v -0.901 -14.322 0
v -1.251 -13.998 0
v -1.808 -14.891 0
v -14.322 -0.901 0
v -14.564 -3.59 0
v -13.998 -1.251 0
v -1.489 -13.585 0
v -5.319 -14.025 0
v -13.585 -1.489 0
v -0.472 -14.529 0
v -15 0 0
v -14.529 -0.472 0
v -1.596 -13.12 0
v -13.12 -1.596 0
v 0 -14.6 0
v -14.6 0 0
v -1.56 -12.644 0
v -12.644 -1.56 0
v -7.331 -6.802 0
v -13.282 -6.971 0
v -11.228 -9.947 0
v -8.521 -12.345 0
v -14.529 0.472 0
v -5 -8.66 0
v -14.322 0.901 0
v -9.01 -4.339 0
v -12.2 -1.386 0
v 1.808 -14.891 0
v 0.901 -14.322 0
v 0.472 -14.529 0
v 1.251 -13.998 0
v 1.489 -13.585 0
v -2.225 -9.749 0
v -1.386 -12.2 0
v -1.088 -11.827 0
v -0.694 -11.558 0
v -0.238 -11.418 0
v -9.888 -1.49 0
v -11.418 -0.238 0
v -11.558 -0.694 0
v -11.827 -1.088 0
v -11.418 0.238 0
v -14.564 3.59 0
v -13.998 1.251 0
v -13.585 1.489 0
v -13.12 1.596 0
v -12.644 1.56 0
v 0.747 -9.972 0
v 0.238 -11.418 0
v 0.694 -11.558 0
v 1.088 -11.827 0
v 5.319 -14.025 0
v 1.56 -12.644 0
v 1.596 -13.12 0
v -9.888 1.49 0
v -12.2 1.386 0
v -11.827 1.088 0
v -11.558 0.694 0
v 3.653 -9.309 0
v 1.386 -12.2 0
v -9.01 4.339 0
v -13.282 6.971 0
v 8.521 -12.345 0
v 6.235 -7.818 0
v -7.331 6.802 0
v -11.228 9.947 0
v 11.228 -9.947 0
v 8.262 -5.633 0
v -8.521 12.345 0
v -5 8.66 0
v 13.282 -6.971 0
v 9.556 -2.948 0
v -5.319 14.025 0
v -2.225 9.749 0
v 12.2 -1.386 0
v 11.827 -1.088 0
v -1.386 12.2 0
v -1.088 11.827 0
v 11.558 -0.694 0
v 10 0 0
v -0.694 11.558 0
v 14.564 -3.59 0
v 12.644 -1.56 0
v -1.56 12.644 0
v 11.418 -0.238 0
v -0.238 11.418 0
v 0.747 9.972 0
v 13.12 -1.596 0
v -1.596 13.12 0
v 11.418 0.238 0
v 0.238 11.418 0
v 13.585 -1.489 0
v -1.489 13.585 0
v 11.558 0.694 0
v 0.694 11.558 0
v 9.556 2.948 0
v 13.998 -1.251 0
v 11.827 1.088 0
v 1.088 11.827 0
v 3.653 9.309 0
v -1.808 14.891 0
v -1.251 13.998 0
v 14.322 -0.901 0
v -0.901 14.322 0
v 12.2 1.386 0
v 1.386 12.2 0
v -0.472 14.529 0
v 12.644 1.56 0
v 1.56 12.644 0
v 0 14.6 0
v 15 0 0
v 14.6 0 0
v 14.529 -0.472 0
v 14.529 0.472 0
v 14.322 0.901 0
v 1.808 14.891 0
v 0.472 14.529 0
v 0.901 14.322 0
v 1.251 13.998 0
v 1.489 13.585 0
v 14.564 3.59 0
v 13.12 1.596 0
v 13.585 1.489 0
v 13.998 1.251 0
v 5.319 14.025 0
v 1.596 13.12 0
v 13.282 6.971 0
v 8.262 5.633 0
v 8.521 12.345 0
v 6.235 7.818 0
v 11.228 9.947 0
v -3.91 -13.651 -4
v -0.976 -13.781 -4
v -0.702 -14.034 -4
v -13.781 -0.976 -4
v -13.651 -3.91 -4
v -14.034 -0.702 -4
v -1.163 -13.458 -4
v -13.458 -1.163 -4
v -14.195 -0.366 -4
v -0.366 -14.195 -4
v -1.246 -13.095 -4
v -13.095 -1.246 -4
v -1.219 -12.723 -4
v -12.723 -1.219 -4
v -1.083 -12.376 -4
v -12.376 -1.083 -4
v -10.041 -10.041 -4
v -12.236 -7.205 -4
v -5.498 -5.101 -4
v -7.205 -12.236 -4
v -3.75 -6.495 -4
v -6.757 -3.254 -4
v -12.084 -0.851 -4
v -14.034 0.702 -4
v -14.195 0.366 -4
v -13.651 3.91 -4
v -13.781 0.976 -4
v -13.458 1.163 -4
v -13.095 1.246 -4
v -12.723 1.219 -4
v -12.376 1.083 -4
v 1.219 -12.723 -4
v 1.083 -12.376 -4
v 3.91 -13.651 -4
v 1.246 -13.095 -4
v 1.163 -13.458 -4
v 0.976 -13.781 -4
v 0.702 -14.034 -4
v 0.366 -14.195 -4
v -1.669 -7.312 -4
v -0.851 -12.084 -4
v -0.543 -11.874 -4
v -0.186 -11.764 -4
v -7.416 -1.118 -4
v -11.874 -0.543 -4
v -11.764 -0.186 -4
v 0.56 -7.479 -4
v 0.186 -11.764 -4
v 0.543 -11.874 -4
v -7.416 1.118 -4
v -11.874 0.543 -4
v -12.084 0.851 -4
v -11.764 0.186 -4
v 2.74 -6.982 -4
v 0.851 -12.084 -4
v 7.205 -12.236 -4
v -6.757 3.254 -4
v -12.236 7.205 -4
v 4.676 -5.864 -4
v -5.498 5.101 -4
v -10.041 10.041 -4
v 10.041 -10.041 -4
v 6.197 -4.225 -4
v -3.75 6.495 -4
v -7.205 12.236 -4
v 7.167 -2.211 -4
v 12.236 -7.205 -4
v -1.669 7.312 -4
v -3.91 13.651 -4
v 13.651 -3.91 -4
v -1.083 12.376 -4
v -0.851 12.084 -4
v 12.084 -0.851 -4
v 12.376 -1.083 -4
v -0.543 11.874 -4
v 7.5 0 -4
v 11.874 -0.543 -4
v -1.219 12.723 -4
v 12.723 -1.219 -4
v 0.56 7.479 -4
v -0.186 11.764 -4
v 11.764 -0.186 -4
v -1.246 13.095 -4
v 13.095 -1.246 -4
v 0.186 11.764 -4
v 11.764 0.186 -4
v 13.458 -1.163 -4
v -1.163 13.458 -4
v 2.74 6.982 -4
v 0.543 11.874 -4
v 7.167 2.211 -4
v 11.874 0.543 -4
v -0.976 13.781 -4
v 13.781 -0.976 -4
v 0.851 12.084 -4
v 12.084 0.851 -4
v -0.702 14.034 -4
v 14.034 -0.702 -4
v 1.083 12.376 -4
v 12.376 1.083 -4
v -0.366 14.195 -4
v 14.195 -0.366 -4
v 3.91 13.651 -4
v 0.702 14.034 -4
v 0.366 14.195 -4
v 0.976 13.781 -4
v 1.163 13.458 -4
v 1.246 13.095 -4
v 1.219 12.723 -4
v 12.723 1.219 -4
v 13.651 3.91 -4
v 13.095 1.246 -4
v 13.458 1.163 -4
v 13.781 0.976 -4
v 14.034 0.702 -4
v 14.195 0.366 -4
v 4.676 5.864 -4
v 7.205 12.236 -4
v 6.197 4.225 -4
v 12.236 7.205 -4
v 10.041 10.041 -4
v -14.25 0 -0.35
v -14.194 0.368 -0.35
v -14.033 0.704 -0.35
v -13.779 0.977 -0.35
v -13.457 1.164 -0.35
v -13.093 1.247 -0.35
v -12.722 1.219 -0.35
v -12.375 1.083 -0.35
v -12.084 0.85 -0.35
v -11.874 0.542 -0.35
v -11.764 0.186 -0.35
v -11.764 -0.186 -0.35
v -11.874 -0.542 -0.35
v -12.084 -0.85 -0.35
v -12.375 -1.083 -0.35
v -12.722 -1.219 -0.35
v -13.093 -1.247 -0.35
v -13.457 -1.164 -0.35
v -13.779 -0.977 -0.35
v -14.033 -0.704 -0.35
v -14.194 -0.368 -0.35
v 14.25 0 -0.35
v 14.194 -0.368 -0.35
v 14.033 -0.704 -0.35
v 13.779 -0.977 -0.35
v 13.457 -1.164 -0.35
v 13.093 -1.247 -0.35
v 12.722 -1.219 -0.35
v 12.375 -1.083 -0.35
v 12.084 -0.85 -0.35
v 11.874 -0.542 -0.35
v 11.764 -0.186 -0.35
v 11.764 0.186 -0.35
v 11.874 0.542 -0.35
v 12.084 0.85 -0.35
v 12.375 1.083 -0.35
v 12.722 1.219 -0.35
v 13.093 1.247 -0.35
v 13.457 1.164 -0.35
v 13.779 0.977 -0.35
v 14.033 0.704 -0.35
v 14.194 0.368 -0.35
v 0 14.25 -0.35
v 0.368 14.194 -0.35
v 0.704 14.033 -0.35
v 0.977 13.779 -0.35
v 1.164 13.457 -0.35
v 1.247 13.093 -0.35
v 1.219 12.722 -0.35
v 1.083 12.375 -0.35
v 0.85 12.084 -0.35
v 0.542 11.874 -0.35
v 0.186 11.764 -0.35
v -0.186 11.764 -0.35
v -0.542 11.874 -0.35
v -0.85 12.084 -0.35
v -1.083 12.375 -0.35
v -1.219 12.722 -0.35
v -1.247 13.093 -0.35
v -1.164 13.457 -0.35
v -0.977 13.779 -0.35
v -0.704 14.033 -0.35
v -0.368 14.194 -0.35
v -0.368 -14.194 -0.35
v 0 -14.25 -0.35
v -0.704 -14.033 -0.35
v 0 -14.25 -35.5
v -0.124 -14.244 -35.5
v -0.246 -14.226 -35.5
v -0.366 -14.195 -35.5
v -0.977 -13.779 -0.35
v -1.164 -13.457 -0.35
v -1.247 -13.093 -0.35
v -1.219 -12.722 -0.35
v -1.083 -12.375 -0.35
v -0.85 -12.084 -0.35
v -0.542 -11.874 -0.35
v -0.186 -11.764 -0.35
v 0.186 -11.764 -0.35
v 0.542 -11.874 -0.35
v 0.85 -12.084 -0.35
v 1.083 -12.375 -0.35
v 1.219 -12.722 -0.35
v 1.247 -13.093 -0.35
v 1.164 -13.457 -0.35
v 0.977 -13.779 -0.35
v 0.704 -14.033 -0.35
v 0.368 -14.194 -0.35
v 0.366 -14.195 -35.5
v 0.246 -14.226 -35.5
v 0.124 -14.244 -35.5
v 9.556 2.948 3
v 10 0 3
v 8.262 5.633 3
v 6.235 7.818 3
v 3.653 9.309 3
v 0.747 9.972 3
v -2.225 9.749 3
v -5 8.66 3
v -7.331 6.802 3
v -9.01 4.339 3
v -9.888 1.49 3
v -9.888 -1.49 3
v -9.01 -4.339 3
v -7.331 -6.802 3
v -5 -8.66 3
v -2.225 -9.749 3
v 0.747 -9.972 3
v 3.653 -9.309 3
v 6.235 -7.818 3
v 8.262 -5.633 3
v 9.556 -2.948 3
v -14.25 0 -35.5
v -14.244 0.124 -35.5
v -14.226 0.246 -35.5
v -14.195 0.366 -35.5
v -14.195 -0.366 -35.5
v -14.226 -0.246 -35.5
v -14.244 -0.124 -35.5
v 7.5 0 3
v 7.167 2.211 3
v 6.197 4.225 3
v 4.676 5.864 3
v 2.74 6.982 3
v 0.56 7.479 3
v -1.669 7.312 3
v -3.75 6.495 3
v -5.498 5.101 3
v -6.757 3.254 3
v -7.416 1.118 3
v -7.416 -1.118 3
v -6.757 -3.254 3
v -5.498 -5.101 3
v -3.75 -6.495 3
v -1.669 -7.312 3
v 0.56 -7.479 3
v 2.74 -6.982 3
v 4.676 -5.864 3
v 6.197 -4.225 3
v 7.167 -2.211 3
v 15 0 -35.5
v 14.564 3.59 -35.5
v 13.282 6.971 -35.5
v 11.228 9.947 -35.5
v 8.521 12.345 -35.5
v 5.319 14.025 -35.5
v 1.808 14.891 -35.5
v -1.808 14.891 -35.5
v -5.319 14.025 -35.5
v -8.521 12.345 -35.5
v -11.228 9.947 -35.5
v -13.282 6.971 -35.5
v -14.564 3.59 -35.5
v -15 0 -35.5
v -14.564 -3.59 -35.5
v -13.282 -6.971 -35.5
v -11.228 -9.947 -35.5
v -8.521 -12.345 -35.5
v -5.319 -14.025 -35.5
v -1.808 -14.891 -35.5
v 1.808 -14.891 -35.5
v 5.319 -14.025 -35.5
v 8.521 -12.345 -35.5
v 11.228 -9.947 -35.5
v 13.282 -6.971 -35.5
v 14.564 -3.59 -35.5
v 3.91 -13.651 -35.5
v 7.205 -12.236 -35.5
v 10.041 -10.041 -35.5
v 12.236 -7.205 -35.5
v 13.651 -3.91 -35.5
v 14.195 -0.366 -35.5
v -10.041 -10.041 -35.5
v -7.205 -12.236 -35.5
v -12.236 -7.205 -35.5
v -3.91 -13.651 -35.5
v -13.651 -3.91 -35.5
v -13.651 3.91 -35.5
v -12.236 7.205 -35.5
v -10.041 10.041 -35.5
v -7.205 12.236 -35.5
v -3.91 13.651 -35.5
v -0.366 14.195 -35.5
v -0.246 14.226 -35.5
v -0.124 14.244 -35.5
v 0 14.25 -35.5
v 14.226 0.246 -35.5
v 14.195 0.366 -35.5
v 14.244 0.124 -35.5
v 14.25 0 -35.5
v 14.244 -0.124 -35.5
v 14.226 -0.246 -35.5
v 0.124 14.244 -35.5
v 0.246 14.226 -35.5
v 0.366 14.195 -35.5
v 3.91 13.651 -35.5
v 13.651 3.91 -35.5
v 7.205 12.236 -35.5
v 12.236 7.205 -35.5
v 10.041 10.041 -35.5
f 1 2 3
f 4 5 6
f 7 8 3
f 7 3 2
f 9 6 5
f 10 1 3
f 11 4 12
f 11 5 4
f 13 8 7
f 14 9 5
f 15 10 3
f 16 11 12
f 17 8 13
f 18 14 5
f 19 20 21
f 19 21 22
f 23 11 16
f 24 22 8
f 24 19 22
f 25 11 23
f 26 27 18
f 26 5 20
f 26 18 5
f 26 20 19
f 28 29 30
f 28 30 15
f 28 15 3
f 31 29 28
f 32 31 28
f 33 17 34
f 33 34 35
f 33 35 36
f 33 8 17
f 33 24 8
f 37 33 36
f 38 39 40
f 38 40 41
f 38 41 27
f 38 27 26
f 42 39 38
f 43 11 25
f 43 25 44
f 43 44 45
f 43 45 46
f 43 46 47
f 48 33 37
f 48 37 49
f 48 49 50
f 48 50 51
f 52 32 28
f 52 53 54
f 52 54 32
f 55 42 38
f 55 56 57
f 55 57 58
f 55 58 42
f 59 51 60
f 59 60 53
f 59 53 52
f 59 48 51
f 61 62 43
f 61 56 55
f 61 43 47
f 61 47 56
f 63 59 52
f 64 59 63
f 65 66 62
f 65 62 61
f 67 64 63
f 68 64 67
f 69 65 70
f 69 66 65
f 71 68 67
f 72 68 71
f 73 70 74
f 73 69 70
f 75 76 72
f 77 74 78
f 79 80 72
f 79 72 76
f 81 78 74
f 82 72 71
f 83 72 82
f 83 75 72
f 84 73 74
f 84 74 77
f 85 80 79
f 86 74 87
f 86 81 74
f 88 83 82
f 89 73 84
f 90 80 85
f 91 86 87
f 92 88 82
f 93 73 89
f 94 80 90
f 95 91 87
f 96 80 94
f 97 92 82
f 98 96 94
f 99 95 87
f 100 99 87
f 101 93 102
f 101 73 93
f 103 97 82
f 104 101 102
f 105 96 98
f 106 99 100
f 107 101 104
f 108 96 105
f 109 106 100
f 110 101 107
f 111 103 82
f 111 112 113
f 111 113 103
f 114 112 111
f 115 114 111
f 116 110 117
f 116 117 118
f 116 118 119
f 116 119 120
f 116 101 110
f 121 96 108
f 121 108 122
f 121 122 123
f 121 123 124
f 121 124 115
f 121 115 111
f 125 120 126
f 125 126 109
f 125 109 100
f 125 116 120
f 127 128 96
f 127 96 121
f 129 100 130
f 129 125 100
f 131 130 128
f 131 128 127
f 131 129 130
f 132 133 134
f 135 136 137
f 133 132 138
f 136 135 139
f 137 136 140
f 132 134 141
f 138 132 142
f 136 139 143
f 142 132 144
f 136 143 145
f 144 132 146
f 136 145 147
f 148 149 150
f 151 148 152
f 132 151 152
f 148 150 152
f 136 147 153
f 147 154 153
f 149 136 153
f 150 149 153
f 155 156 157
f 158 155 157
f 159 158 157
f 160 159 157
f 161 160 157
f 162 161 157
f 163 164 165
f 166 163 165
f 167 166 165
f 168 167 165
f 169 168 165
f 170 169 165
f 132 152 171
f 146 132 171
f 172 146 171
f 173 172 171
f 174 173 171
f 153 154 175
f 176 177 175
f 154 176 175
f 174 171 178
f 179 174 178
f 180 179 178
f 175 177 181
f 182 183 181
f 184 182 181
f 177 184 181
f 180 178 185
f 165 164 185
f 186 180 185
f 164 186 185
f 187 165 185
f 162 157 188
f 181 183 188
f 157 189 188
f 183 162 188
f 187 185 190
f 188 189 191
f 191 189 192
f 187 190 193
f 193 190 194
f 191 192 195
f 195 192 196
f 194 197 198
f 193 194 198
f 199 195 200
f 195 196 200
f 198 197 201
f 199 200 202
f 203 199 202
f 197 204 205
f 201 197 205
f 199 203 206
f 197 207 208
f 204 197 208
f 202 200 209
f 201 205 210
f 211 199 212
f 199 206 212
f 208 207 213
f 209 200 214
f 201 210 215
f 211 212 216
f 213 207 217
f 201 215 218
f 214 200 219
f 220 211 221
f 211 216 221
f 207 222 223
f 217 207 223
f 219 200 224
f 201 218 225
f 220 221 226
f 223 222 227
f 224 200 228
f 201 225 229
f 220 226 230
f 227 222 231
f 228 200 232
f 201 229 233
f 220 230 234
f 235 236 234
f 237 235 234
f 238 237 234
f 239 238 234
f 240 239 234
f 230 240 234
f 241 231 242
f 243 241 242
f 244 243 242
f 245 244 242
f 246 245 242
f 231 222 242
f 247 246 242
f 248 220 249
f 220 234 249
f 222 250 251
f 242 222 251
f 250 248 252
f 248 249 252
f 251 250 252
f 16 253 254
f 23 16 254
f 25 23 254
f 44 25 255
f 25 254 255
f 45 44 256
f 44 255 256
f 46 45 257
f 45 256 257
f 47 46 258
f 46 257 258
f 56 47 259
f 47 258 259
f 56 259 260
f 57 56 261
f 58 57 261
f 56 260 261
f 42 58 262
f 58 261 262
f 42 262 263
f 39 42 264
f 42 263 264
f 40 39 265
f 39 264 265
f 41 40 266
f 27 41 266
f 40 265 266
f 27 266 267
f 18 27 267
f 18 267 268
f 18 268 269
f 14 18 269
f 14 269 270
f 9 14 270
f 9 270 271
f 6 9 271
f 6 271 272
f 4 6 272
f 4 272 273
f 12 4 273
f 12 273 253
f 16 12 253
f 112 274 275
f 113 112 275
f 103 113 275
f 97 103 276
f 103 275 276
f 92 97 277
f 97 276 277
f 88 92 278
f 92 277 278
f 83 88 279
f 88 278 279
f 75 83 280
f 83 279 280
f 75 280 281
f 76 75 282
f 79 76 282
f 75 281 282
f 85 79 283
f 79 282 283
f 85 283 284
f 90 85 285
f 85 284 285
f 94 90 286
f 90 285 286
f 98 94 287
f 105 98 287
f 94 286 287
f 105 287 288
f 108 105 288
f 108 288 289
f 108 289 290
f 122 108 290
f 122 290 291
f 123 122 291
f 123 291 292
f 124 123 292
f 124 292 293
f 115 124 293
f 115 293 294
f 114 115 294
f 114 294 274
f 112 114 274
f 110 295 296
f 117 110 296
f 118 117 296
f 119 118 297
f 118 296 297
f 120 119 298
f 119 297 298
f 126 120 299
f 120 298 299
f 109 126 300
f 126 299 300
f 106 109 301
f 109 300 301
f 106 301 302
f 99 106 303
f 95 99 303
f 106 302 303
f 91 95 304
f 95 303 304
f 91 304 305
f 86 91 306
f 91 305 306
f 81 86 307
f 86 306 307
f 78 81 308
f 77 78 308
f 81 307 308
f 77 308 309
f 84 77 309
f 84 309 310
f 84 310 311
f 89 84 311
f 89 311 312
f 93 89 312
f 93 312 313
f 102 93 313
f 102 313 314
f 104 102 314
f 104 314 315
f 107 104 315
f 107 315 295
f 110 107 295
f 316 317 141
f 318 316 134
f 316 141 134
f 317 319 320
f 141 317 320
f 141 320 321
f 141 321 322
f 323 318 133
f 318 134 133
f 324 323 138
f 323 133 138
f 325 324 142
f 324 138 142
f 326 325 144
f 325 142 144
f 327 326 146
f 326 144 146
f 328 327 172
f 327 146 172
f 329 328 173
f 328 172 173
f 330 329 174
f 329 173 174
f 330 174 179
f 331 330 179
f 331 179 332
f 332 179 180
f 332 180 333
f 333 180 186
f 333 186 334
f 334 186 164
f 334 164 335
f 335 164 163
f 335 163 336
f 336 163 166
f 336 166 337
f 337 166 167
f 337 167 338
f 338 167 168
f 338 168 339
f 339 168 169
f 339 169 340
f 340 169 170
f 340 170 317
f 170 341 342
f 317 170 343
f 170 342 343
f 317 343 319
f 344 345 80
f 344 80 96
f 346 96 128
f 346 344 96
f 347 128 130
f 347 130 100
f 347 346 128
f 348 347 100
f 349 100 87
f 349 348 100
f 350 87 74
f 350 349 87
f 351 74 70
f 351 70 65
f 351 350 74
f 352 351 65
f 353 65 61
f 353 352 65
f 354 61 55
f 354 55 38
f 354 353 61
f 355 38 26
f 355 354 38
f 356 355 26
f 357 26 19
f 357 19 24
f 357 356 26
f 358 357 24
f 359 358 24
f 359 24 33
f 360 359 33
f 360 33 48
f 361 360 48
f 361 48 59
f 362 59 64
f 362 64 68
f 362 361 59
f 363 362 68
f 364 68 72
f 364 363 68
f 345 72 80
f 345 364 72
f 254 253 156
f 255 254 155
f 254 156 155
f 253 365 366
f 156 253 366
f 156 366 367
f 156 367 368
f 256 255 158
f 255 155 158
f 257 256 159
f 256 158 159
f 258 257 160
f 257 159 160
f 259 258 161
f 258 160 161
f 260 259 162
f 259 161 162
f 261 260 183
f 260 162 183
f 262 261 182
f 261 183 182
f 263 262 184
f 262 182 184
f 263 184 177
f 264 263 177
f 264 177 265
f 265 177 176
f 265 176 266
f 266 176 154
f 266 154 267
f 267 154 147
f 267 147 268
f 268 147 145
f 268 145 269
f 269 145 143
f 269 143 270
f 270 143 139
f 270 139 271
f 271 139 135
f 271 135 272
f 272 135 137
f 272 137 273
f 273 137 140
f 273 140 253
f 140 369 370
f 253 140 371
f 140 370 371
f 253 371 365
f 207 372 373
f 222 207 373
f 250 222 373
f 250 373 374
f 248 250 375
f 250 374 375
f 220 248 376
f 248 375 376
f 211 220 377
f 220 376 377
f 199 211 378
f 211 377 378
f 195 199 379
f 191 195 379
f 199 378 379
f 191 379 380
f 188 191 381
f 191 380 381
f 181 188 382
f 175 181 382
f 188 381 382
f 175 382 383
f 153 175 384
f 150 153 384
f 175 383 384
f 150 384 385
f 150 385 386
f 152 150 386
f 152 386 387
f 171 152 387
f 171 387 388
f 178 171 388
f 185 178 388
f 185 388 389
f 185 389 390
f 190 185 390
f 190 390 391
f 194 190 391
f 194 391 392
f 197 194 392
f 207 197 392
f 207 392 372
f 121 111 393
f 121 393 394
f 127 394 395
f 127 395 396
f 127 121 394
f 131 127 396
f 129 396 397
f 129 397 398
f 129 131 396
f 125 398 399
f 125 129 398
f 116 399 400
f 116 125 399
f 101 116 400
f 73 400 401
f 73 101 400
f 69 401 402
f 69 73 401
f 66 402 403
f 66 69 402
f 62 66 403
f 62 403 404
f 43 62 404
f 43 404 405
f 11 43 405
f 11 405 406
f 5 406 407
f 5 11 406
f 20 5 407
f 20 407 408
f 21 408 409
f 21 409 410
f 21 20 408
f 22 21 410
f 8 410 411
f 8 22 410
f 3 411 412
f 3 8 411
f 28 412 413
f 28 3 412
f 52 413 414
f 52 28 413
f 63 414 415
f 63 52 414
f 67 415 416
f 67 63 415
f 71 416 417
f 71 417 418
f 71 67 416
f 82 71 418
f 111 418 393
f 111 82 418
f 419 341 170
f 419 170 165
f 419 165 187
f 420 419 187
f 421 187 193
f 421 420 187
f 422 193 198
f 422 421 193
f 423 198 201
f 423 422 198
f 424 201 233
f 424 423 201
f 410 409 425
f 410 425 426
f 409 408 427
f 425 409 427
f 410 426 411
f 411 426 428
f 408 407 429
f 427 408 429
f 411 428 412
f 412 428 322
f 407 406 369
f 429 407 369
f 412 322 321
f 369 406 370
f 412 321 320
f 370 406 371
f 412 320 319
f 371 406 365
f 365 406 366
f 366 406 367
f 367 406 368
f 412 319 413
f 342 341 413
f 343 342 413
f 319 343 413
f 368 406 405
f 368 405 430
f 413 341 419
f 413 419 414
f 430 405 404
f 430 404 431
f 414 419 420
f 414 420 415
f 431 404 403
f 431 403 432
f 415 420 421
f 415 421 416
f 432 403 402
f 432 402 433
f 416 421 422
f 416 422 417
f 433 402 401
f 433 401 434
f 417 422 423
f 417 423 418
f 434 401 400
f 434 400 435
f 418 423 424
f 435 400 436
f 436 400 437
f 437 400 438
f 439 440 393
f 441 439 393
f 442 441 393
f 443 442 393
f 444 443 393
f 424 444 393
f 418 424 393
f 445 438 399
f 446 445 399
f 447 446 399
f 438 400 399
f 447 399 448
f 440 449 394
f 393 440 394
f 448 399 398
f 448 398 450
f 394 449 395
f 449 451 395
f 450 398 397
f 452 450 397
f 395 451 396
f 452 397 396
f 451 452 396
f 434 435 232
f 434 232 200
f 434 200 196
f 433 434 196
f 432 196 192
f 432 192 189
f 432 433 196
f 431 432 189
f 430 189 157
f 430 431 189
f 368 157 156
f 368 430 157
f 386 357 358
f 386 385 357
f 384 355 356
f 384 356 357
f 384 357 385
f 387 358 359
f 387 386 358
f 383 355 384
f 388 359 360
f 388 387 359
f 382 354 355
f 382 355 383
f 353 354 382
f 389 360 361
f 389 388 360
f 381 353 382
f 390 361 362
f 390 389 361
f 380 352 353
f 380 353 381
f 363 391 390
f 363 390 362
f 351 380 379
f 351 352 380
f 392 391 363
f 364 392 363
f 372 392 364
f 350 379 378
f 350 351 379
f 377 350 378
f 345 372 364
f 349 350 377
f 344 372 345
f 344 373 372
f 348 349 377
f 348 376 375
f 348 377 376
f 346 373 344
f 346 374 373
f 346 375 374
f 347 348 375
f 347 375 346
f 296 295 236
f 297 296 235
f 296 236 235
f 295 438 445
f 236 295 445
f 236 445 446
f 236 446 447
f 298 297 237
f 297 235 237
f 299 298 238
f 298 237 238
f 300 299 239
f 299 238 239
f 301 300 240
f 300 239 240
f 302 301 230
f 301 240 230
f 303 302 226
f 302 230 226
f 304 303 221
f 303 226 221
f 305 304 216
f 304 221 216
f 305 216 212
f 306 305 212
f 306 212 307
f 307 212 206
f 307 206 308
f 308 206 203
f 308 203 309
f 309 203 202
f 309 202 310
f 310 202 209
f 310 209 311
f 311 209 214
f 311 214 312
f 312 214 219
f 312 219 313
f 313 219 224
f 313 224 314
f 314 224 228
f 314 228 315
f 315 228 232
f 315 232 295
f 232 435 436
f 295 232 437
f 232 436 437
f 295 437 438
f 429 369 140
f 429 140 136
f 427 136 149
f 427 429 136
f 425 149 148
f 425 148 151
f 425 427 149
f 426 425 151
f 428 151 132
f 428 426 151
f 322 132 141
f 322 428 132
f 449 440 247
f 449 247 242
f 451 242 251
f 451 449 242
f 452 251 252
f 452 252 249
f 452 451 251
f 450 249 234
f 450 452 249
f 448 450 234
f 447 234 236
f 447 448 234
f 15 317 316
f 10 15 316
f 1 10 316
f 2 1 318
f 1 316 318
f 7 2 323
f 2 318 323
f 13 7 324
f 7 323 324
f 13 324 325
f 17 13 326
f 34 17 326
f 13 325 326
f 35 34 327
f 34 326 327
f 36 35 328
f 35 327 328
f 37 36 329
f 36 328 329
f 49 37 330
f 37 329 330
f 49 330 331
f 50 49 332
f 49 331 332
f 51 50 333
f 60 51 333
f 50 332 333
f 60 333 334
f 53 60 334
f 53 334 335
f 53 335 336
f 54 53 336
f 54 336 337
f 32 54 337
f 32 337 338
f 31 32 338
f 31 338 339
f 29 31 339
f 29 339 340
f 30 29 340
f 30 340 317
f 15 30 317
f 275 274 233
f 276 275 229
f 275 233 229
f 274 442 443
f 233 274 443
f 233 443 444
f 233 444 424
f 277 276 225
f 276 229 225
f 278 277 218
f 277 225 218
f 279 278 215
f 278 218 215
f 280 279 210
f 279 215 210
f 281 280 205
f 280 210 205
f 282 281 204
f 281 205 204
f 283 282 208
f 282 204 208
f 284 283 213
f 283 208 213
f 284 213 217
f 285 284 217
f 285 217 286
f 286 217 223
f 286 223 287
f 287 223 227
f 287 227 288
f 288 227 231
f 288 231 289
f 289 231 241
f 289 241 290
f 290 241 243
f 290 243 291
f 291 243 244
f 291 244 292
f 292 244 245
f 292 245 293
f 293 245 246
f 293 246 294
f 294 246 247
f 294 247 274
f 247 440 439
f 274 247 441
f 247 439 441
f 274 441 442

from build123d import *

# Parameters (mm, degrees)
SKETCH1_R                       = 15
BOSS_EXTRUDE1_DEPTH             = 35.5
SKETCH2_R                       = 14.2
CUT_EXTRUDE1_DEPTH              = 31.5
SKETCH3_R                       = 7.5
CUT_EXTRUDE2_DEPTH              = 42.355168964
M3X0_5_TAPPED_HOLE1_D           = 2.5
M3X0_5_TAPPED_HOLE1_CSINK_D     = 3.2
M3X0_5_TAPPED_HOLE1_CSINK_ANGLE = 90
CIRPATTERN2_COUNT               = 4
BOSS_EXTRUDE2_START             = 3
SKETCH8_R                       = 10
SKETCH8_R_2                     = 7.5
BOSS_EXTRUDE2_DEPTH             = 3


with BuildPart() as part:
    # Sketch1 → Boss-Extrude1 (new body)
    with BuildSketch(Plane.XY):
        Circle(SKETCH1_R)
    extrude(amount=-BOSS_EXTRUDE1_DEPTH)

    # Sketch2 → Cut-Extrude1 (cut)
    with BuildSketch(Plane.XY.offset(-35.5)):
        Circle(SKETCH2_R)
    extrude(amount=CUT_EXTRUDE1_DEPTH, mode=Mode.SUBTRACT)

    # Sketch3 → Cut-Extrude2 (cut, through all)
    with BuildSketch(Plane(origin=(0, 0, 0), x_dir=(-1, 0, 0), z_dir=(0, 0, -1))):
        with Locations(Location((0, 0, 0), (0, 0, 180))):
            Circle(SKETCH3_R)
    extrude(amount=CUT_EXTRUDE2_DEPTH, mode=Mode.SUBTRACT)

    # M3x0.5 Tapped Hole1 (through all)
    with Locations(Plane(origin=(0, 0, 0), x_dir=(-1, 0, 0), z_dir=(0, 0, 1))):
        with Locations((-13, 0)):
            m3x0_5_tapped_hole1 = CounterSinkHole(M3X0_5_TAPPED_HOLE1_D / 2, M3X0_5_TAPPED_HOLE1_CSINK_D / 2, counter_sink_angle=M3X0_5_TAPPED_HOLE1_CSINK_ANGLE)

    # CirPattern2: M3x0.5 Tapped Hole1 ×4 about axis
    cirpattern2_axis = Axis((0, 0, 0), (0, 0, 1))
    for i in range(1, CIRPATTERN2_COUNT):
        add(m3x0_5_tapped_hole1.rotate(cirpattern2_axis, i * 360 / CIRPATTERN2_COUNT), mode=Mode.SUBTRACT)

    # Sketch8 → Boss-Extrude2 (add)
    with BuildSketch(Plane.XY.offset(BOSS_EXTRUDE2_START)):
        Circle(SKETCH8_R)
        Circle(SKETCH8_R_2, mode=Mode.SUBTRACT)
    extrude(amount=-BOSS_EXTRUDE2_DEPTH)


solid = part.part
